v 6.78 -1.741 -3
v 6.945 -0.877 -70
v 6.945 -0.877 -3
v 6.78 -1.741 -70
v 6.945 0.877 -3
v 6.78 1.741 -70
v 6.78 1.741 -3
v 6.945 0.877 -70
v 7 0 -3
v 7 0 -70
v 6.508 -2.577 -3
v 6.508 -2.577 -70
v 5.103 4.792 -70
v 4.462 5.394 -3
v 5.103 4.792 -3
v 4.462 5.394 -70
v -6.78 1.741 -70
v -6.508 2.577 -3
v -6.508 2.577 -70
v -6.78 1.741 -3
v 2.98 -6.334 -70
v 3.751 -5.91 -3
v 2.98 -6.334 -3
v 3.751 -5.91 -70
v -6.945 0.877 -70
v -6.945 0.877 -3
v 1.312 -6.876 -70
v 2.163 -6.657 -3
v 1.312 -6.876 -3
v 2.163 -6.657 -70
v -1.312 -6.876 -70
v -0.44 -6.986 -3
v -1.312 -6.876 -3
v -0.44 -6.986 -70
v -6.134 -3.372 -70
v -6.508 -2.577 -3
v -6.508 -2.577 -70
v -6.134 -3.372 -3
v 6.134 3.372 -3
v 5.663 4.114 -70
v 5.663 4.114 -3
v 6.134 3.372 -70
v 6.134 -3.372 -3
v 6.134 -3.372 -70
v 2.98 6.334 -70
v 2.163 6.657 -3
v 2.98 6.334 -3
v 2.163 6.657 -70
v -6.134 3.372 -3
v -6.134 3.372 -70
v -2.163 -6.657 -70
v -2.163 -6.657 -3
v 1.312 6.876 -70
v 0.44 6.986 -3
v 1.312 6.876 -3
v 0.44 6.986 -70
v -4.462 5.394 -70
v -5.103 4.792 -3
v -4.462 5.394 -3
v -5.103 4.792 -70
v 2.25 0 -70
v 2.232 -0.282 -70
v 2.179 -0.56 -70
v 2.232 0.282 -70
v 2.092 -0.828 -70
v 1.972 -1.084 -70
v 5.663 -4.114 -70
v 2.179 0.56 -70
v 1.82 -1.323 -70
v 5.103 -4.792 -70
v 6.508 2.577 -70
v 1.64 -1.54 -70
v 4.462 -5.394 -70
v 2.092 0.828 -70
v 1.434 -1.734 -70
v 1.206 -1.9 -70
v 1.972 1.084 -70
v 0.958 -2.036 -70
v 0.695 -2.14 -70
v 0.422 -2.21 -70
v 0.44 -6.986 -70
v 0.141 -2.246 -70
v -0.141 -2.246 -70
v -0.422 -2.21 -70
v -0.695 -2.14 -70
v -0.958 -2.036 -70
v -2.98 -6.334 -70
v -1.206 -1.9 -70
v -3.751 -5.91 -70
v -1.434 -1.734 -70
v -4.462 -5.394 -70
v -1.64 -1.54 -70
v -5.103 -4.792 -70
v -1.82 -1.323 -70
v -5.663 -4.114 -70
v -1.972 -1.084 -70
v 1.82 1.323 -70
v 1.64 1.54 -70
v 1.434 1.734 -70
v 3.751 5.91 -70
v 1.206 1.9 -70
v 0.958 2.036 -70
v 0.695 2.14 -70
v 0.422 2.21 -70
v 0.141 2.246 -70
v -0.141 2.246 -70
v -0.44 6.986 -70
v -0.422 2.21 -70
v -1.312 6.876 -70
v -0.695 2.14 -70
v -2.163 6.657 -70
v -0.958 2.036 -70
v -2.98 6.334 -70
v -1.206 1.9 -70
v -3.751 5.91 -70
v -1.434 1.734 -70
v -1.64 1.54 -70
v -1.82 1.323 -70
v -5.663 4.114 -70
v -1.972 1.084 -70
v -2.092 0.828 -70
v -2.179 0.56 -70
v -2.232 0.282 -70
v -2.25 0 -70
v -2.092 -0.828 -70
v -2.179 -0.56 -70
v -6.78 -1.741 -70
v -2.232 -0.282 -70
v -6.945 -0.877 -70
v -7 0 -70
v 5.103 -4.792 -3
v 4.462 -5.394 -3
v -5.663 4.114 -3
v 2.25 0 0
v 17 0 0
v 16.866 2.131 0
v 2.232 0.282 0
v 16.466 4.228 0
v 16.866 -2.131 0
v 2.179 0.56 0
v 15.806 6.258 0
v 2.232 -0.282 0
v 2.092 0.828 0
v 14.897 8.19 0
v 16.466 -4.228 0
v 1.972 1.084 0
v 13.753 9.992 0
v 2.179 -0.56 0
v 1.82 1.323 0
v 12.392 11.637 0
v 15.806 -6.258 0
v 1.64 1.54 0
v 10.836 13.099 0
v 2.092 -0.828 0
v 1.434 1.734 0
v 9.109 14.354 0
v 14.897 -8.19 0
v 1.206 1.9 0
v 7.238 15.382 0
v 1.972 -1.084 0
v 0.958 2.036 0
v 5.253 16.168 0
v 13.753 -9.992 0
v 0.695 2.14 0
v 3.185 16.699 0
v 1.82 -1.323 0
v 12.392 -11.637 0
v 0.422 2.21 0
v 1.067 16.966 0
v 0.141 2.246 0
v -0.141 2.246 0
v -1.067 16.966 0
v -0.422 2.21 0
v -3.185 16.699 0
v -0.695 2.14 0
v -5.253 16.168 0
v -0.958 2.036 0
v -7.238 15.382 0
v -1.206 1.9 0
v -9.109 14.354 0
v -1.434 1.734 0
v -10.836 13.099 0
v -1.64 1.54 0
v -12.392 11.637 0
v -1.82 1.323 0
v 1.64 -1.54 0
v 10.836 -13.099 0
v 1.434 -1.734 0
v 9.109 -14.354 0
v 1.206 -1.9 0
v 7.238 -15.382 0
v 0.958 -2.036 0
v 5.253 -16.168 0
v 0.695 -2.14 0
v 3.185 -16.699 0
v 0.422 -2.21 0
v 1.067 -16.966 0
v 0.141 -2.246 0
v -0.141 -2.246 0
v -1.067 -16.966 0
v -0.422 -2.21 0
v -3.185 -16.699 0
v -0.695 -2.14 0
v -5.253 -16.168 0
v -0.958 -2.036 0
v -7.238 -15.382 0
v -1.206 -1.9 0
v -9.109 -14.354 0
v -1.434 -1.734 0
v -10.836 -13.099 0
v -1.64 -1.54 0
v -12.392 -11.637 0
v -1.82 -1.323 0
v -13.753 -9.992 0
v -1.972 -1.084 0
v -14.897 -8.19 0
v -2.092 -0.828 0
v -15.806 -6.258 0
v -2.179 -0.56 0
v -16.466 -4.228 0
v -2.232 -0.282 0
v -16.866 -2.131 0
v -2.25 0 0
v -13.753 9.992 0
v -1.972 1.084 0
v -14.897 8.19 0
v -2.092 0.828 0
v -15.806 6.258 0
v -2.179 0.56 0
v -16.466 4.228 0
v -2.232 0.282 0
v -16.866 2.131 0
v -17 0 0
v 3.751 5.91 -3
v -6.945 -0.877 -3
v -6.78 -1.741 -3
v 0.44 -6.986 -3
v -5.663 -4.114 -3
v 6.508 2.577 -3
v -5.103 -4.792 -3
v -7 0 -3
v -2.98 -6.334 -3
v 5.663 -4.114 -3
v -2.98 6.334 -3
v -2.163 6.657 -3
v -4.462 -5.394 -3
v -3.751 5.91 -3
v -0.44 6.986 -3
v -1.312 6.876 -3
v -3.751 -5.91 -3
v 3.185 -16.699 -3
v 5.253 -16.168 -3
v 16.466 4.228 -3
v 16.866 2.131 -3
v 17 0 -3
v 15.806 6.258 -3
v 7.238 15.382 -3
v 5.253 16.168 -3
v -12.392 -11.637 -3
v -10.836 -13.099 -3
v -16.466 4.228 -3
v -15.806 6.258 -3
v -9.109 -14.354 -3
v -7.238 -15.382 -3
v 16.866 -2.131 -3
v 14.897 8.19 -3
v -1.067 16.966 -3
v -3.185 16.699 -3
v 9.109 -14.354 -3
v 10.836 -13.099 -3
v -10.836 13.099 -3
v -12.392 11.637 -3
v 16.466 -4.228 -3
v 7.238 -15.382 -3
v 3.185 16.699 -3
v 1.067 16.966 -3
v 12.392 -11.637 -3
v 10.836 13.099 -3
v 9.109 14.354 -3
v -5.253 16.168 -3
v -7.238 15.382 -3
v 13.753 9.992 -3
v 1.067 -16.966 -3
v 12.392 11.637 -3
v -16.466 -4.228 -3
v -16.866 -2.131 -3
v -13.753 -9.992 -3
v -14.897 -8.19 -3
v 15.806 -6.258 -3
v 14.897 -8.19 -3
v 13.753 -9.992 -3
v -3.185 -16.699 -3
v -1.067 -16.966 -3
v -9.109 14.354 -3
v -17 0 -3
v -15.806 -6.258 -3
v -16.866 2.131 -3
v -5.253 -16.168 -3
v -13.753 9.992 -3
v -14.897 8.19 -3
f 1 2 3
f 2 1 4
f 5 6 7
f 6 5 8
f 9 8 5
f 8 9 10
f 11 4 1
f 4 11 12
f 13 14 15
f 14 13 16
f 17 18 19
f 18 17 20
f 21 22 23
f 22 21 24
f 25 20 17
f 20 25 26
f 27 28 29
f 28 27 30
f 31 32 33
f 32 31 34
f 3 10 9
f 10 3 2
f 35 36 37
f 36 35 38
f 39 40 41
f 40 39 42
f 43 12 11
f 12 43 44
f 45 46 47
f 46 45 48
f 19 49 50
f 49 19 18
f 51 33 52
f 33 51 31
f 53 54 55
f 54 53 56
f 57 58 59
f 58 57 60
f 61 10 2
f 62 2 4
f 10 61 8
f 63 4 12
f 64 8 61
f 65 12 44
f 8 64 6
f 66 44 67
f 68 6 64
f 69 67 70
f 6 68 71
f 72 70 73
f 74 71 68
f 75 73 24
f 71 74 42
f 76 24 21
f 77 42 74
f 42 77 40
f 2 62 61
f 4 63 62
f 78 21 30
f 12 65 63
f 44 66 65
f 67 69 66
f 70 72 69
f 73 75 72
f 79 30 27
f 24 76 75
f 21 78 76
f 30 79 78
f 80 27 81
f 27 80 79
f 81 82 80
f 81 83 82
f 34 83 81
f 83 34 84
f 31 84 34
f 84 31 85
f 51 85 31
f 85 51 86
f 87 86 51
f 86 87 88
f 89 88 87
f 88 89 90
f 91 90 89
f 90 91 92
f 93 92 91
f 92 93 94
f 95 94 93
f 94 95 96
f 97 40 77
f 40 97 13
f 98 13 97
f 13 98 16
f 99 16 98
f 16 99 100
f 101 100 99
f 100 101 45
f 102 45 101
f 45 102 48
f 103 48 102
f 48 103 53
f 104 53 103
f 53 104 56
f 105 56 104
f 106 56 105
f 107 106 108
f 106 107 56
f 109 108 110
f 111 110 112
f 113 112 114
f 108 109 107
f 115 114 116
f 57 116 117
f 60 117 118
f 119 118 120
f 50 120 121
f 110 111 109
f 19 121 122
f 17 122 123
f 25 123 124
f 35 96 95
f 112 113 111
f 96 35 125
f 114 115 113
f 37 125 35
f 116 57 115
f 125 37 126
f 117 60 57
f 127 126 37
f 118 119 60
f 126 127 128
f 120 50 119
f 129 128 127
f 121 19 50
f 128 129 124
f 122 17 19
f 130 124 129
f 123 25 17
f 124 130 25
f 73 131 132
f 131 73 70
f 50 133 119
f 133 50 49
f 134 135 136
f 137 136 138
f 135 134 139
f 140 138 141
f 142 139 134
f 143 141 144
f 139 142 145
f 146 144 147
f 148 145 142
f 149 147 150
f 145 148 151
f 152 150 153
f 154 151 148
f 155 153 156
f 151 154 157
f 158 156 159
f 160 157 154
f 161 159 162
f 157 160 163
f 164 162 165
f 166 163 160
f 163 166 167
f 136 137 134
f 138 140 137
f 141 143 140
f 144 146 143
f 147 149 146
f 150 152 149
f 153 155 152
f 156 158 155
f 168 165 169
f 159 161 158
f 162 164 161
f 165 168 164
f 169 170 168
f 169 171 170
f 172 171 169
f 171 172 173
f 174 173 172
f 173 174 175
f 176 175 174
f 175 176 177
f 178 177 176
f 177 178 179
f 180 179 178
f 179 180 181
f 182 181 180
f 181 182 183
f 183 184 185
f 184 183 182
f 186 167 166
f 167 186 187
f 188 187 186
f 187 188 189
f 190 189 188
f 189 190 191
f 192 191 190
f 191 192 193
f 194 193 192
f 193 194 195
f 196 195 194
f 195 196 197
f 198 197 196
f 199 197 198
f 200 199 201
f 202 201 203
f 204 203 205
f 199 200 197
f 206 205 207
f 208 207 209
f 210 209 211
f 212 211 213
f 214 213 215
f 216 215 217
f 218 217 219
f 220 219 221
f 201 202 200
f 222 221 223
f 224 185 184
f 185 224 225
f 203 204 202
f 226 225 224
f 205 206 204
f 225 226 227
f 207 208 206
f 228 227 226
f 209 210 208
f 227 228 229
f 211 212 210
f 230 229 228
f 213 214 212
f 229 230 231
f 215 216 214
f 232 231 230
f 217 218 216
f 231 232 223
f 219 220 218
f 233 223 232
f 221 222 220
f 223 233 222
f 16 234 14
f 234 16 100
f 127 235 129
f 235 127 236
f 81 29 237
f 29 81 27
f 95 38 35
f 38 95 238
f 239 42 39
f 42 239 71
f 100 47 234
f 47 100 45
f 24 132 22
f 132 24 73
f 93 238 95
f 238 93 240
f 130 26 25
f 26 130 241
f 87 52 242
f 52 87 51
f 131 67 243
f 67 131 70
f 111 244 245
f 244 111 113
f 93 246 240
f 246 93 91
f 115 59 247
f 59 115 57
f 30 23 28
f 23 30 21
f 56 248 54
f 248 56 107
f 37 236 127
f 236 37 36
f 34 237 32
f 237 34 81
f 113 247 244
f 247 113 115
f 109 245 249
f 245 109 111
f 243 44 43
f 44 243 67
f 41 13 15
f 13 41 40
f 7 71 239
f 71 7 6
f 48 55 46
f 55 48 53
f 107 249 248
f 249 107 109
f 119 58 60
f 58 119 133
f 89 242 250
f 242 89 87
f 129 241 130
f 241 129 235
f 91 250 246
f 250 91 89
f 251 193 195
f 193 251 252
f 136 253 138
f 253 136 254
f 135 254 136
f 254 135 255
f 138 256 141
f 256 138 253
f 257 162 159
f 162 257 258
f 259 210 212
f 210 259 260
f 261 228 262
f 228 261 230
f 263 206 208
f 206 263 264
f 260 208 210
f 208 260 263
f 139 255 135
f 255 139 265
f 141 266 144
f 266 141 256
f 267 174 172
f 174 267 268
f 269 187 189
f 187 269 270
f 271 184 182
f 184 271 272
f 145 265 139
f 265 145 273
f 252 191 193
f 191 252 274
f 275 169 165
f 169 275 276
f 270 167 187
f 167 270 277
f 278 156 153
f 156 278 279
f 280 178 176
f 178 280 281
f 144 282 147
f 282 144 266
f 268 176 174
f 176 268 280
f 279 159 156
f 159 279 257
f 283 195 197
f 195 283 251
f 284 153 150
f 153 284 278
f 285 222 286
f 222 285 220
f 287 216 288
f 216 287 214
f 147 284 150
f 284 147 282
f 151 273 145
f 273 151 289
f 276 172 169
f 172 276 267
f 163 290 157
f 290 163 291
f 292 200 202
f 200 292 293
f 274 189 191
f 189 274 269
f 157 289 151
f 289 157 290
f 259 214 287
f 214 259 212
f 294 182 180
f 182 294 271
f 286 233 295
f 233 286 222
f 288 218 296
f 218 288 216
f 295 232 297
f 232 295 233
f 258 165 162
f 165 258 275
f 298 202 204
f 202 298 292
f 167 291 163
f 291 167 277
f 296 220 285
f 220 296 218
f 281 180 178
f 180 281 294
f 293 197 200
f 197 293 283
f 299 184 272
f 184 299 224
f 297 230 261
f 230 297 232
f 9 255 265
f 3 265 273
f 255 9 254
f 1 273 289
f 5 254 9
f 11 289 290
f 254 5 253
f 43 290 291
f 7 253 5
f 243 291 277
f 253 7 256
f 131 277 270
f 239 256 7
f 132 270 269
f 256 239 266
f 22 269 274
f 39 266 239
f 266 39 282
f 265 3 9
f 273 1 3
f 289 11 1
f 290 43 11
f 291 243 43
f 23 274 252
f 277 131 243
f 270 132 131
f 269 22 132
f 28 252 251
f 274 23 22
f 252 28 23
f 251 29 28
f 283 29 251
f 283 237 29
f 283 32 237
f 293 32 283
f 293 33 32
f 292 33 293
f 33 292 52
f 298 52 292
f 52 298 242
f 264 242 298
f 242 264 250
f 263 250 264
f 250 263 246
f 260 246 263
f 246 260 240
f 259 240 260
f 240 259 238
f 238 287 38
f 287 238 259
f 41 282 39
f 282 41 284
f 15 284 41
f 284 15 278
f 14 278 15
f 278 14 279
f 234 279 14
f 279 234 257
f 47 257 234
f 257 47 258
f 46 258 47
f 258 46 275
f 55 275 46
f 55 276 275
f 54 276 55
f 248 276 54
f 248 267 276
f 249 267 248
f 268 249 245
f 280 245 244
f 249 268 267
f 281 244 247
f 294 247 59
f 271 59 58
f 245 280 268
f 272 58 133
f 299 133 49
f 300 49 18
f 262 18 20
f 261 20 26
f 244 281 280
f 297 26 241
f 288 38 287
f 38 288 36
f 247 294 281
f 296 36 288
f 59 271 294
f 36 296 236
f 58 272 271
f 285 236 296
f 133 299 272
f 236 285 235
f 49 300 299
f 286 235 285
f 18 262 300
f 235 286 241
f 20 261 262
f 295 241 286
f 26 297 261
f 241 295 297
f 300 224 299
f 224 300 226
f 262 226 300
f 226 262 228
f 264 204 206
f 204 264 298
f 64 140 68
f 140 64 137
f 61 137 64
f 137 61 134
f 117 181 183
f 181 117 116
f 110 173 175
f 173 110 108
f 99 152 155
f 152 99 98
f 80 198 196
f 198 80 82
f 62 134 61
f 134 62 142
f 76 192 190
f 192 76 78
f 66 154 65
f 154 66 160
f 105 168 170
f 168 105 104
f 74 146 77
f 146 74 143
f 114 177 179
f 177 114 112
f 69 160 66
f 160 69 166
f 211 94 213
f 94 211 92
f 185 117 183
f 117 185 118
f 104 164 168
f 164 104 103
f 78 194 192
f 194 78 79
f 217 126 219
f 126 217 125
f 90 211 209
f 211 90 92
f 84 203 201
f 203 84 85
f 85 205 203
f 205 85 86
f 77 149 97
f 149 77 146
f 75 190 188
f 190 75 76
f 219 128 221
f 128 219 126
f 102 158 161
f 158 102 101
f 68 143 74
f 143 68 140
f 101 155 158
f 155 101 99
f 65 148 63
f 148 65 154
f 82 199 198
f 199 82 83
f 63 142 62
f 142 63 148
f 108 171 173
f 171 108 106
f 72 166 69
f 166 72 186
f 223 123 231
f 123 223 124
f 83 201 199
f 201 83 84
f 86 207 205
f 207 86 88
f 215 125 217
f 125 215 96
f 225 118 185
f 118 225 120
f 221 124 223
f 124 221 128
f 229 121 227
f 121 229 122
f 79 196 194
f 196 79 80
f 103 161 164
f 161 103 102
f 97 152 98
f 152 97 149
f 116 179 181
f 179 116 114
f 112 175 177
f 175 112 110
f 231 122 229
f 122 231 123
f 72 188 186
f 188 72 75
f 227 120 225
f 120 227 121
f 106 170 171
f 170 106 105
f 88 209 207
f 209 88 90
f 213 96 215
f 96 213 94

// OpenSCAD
$fn = 50;


difference() {
	union() {
		translate(v = [0, 0, -70.0000000000]) {
			cylinder(h = 70, r = 7.0000000000);
		}
		translate(v = [0, 0, -3.0000000000]) {
			cylinder(h = 3, r = 17.0000000000);
		}
	}
	union() {
		#translate(v = [0, 0, -70]) {
			cylinder(h = 70, r = 2.2500000000);
		}
	}
}
